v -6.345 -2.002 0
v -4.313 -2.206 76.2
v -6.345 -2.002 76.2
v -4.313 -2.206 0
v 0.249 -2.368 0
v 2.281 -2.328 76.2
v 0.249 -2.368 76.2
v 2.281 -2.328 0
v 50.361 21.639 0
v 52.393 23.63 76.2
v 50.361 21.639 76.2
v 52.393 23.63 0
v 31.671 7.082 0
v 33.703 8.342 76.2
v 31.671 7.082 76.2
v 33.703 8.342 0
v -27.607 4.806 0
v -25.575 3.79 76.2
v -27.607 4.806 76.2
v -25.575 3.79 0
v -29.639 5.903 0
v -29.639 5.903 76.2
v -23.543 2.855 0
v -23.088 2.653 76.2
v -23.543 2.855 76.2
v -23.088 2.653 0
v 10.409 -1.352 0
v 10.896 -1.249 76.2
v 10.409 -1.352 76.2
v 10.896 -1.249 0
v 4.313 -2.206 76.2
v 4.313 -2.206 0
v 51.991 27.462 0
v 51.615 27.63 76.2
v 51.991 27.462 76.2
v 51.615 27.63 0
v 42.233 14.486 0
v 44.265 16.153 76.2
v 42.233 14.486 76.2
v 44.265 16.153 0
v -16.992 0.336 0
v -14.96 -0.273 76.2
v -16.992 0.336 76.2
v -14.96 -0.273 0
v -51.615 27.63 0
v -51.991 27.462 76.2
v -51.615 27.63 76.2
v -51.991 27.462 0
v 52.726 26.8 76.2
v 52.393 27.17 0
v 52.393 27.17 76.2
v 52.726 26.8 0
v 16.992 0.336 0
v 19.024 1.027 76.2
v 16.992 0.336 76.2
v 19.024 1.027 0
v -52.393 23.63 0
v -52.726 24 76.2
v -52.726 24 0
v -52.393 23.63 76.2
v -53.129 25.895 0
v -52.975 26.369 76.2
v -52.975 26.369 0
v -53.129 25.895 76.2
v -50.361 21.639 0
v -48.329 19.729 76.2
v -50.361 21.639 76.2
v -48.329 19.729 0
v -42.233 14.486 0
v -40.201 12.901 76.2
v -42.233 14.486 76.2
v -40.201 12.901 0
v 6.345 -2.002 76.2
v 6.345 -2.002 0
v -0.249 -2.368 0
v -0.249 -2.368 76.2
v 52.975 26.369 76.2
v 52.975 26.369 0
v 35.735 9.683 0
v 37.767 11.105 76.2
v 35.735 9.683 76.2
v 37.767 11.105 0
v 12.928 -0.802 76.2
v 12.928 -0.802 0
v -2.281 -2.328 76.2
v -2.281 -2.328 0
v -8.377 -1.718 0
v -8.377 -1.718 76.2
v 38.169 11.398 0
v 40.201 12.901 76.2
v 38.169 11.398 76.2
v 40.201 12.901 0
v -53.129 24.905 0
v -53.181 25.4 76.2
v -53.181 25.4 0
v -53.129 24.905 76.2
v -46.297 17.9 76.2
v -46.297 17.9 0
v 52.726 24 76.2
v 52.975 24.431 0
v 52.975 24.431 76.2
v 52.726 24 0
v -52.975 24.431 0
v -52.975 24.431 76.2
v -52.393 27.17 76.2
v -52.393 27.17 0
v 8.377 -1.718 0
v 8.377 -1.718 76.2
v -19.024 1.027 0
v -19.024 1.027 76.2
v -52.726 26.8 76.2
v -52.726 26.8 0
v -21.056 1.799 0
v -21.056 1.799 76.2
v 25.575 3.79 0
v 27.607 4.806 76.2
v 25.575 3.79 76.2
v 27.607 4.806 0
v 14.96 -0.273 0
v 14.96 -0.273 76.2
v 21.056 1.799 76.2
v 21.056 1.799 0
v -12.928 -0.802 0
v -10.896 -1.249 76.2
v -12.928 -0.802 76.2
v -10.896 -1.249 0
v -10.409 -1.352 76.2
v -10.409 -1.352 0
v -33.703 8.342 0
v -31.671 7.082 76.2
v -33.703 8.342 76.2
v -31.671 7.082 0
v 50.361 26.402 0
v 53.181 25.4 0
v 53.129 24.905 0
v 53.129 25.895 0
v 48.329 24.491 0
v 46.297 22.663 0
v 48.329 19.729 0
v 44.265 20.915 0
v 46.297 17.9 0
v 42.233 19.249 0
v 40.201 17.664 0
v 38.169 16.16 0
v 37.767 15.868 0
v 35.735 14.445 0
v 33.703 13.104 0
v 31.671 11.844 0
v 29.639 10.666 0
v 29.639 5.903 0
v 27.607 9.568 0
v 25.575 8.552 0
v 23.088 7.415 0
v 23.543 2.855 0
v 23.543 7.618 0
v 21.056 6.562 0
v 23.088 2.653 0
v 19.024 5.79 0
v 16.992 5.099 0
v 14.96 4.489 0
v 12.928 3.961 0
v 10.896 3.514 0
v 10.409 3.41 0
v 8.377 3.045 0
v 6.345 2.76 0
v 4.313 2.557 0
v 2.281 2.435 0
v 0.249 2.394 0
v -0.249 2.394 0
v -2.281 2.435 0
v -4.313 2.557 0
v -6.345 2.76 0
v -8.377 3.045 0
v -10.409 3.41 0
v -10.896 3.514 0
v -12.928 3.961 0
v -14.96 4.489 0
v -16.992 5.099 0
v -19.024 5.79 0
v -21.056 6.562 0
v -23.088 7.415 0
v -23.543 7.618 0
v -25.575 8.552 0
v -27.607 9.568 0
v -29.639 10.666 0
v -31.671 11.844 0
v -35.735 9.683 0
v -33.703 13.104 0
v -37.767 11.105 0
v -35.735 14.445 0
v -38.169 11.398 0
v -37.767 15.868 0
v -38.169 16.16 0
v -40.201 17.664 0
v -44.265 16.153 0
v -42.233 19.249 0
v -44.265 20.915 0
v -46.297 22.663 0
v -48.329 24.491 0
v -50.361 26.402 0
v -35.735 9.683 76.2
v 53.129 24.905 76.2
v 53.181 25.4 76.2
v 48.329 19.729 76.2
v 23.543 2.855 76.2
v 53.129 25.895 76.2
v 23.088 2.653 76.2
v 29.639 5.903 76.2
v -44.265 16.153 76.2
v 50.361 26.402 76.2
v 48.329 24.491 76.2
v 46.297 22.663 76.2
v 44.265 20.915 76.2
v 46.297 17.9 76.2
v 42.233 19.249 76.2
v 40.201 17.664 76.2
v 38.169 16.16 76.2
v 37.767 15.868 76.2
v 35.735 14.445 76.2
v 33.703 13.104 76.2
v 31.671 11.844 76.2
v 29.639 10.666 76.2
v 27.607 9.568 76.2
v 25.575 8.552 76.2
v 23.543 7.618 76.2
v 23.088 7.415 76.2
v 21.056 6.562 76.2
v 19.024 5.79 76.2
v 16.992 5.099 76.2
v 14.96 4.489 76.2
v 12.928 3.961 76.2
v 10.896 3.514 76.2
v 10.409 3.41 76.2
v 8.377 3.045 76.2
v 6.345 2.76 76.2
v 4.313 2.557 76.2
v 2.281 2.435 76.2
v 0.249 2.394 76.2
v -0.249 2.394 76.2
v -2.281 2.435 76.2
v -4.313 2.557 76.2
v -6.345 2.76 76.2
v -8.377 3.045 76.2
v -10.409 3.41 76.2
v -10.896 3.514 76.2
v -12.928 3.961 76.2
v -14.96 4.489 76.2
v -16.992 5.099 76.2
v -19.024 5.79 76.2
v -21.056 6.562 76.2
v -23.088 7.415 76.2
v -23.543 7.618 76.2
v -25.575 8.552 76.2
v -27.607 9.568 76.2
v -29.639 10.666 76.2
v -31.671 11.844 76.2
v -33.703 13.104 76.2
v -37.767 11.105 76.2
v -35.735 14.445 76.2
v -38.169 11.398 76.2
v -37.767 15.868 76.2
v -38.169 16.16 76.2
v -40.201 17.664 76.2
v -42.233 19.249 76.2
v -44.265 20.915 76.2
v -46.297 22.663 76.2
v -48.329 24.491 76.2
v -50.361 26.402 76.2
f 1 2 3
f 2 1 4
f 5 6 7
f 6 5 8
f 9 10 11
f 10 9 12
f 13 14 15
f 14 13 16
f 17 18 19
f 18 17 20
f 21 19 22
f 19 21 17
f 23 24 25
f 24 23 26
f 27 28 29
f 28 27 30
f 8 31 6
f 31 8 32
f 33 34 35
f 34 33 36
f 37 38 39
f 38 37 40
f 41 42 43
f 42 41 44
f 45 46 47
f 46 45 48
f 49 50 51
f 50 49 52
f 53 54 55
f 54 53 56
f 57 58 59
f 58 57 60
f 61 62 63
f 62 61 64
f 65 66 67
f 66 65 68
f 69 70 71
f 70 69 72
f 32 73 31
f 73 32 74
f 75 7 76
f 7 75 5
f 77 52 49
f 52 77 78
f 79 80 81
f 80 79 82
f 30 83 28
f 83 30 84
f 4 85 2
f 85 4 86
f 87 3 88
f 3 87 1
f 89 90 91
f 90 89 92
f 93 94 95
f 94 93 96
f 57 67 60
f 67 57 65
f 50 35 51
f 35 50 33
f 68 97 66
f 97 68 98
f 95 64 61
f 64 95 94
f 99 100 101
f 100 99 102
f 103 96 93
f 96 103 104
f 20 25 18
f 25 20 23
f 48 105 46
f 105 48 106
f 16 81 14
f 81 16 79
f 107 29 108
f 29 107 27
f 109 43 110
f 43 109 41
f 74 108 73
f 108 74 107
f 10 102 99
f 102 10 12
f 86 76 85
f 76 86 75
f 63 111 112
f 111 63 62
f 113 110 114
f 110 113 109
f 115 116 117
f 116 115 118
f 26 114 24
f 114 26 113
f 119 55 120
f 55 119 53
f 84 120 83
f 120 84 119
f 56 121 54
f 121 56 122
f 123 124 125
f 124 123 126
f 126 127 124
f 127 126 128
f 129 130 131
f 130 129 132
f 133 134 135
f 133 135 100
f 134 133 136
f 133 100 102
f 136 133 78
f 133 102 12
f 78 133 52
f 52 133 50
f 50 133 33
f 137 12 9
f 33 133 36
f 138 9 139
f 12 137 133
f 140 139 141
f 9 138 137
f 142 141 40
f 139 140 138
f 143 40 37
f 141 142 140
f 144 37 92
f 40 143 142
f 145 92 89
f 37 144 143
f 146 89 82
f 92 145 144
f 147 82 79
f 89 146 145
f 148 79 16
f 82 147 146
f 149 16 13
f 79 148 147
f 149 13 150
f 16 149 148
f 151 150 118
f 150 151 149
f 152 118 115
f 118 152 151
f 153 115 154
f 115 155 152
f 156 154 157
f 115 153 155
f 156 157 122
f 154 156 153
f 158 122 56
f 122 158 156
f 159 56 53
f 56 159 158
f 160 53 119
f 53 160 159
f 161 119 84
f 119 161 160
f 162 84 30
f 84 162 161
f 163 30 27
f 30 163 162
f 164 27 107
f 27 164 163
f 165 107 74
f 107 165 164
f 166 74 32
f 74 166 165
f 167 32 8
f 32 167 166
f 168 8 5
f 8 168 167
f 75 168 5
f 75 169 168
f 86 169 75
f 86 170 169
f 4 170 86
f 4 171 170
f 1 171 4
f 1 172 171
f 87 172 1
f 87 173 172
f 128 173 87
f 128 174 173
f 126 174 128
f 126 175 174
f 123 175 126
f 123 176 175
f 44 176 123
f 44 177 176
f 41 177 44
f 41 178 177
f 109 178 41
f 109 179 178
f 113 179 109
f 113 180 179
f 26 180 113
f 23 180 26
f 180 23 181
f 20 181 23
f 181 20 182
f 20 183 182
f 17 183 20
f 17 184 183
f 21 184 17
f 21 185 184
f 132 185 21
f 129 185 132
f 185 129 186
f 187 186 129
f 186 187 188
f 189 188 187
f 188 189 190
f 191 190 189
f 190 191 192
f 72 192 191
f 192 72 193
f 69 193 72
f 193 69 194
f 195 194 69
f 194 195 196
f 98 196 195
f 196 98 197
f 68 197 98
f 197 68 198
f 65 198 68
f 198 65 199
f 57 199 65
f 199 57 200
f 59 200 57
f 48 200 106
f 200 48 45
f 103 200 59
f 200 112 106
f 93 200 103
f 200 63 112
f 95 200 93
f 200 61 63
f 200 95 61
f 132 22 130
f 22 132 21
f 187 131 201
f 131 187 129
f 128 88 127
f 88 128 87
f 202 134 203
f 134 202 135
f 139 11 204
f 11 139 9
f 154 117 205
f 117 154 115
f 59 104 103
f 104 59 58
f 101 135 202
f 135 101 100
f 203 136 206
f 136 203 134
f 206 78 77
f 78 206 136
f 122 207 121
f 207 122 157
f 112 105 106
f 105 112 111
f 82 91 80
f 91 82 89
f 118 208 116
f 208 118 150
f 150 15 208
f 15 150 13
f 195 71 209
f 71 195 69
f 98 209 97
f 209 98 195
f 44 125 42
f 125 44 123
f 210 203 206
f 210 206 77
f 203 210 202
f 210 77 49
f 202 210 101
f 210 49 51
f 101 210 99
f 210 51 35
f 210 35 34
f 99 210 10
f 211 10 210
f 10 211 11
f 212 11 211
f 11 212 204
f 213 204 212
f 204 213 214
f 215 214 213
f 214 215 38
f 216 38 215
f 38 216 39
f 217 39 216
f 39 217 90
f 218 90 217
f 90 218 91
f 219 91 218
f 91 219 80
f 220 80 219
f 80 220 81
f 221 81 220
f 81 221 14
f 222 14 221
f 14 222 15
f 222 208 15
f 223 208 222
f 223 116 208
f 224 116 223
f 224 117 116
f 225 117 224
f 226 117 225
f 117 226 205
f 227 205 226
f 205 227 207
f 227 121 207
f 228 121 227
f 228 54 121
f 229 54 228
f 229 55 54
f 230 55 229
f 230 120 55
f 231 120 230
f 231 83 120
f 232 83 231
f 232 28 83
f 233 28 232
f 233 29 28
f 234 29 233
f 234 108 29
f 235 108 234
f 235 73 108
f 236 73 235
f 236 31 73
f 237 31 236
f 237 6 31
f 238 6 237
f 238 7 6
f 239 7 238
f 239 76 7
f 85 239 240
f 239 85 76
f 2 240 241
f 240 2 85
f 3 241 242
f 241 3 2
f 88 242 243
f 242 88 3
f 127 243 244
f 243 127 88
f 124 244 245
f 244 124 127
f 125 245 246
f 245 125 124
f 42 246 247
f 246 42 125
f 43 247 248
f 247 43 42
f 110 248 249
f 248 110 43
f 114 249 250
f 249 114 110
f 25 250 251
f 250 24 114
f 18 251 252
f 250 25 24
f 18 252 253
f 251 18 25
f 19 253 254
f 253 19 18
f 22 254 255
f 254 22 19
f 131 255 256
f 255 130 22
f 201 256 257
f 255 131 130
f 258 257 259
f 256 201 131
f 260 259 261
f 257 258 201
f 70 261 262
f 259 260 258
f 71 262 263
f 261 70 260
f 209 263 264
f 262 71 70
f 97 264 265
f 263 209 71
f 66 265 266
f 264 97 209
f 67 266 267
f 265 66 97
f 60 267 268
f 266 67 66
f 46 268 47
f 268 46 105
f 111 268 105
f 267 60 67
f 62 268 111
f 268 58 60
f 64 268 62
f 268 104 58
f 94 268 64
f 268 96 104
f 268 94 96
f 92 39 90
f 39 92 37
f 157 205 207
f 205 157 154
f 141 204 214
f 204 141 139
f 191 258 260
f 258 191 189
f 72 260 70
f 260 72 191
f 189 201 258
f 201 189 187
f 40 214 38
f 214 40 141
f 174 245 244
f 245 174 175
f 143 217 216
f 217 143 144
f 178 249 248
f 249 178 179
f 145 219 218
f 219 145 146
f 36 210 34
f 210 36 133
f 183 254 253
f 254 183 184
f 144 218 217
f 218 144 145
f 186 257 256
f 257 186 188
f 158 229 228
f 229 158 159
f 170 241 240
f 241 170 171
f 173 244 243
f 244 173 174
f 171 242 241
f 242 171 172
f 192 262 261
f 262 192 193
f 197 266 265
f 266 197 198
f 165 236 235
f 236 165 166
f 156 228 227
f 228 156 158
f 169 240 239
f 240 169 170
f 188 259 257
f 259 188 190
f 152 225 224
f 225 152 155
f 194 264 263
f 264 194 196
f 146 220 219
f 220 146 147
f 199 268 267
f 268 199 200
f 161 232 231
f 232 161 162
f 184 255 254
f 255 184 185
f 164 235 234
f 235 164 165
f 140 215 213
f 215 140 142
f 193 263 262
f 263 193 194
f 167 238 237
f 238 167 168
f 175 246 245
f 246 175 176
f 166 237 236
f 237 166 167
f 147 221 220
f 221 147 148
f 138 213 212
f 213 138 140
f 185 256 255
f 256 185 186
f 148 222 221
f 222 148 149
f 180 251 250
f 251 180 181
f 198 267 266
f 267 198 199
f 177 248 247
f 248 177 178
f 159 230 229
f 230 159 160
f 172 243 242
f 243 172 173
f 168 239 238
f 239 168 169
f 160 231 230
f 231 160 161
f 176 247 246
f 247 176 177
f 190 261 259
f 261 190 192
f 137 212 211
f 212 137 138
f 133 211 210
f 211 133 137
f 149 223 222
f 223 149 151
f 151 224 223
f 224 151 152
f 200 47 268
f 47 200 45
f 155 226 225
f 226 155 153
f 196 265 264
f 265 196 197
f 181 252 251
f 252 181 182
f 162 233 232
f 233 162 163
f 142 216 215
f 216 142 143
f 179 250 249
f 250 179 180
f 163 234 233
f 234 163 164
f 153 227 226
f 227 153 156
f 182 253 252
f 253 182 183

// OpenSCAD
// Created by Andrew Moore 2016
//  For questions, please PM me on Thingiverse
//  www.thingiverse.com/TacPar
//
//  Builds a parabolic plate 
//  according to the formula:
//         y= kx^2
//
//  Where the focal length is 1/(4*k)
//   
//
//  This code is designed for 
//  ease of use, not for computational
//  efficiency. You must be patient 
//  when rendering!
//=============================

//to do: 
//      Add text label for parabola parameters
//      Add base with indicator of focal point

//=============================
//Global Constants: 
//  Don't change these. It will break the code.
//=============================
inch = 25.4;

//=============================
//Compiler Options: 
//These will change your viewing options in OpenSCAD
//=============================
$fn = 30;          

//=============================
//Global Print Variables:
//  These variables will adjust how the part is printed 
//  but not affect the overall part shape
//=============================
numfaces = 50; //this adjusts how smooth the parabolic shape will be

//=============================
//Global Mechanical Variables: 
//  Change these to adjust physical properties of the part
//=============================
Plate_Width = 4*inch;
Plate_Height = 3*inch;
Plate_Thickness = 3/16*inch;
focal_length = 1*inch;


//==============================
//Calculated Variables: 
//Do not Change these directly
//==============================
k=1/(4*focal_length);

module main()
{
    //add global logic and call part modules here
    difference()
    {
        hull()
        {
            parabolic_dish();
        }
        translate([0,Plate_Thickness, -0.01]) scale([1,1,1.1]) hull()
        {
            parabolic_dish();
        }    
    }
        
}

module parabolic_dish()
{
   
   difference()
   {
		positives();
		negatives();
    }    
   module positives()
   {
        for(i=[0:numfaces/2])
        {
            xi = i*Plate_Width/numfaces; 
            yi = k*(xi*xi);
       
            translate([xi,yi,0]) 
                cylinder(r=Plate_Thickness/2, h=Plate_Height);
                
            translate([-xi,yi,0]) 
                cylinder(r=Plate_Thickness/2, h=Plate_Height);
        } 
   }
    module negatives()
   {
       //Use this section to put holes in the part
       //for example: mounting holes, etc.
   }   
}

//execute program and draw the part(s)
main();
